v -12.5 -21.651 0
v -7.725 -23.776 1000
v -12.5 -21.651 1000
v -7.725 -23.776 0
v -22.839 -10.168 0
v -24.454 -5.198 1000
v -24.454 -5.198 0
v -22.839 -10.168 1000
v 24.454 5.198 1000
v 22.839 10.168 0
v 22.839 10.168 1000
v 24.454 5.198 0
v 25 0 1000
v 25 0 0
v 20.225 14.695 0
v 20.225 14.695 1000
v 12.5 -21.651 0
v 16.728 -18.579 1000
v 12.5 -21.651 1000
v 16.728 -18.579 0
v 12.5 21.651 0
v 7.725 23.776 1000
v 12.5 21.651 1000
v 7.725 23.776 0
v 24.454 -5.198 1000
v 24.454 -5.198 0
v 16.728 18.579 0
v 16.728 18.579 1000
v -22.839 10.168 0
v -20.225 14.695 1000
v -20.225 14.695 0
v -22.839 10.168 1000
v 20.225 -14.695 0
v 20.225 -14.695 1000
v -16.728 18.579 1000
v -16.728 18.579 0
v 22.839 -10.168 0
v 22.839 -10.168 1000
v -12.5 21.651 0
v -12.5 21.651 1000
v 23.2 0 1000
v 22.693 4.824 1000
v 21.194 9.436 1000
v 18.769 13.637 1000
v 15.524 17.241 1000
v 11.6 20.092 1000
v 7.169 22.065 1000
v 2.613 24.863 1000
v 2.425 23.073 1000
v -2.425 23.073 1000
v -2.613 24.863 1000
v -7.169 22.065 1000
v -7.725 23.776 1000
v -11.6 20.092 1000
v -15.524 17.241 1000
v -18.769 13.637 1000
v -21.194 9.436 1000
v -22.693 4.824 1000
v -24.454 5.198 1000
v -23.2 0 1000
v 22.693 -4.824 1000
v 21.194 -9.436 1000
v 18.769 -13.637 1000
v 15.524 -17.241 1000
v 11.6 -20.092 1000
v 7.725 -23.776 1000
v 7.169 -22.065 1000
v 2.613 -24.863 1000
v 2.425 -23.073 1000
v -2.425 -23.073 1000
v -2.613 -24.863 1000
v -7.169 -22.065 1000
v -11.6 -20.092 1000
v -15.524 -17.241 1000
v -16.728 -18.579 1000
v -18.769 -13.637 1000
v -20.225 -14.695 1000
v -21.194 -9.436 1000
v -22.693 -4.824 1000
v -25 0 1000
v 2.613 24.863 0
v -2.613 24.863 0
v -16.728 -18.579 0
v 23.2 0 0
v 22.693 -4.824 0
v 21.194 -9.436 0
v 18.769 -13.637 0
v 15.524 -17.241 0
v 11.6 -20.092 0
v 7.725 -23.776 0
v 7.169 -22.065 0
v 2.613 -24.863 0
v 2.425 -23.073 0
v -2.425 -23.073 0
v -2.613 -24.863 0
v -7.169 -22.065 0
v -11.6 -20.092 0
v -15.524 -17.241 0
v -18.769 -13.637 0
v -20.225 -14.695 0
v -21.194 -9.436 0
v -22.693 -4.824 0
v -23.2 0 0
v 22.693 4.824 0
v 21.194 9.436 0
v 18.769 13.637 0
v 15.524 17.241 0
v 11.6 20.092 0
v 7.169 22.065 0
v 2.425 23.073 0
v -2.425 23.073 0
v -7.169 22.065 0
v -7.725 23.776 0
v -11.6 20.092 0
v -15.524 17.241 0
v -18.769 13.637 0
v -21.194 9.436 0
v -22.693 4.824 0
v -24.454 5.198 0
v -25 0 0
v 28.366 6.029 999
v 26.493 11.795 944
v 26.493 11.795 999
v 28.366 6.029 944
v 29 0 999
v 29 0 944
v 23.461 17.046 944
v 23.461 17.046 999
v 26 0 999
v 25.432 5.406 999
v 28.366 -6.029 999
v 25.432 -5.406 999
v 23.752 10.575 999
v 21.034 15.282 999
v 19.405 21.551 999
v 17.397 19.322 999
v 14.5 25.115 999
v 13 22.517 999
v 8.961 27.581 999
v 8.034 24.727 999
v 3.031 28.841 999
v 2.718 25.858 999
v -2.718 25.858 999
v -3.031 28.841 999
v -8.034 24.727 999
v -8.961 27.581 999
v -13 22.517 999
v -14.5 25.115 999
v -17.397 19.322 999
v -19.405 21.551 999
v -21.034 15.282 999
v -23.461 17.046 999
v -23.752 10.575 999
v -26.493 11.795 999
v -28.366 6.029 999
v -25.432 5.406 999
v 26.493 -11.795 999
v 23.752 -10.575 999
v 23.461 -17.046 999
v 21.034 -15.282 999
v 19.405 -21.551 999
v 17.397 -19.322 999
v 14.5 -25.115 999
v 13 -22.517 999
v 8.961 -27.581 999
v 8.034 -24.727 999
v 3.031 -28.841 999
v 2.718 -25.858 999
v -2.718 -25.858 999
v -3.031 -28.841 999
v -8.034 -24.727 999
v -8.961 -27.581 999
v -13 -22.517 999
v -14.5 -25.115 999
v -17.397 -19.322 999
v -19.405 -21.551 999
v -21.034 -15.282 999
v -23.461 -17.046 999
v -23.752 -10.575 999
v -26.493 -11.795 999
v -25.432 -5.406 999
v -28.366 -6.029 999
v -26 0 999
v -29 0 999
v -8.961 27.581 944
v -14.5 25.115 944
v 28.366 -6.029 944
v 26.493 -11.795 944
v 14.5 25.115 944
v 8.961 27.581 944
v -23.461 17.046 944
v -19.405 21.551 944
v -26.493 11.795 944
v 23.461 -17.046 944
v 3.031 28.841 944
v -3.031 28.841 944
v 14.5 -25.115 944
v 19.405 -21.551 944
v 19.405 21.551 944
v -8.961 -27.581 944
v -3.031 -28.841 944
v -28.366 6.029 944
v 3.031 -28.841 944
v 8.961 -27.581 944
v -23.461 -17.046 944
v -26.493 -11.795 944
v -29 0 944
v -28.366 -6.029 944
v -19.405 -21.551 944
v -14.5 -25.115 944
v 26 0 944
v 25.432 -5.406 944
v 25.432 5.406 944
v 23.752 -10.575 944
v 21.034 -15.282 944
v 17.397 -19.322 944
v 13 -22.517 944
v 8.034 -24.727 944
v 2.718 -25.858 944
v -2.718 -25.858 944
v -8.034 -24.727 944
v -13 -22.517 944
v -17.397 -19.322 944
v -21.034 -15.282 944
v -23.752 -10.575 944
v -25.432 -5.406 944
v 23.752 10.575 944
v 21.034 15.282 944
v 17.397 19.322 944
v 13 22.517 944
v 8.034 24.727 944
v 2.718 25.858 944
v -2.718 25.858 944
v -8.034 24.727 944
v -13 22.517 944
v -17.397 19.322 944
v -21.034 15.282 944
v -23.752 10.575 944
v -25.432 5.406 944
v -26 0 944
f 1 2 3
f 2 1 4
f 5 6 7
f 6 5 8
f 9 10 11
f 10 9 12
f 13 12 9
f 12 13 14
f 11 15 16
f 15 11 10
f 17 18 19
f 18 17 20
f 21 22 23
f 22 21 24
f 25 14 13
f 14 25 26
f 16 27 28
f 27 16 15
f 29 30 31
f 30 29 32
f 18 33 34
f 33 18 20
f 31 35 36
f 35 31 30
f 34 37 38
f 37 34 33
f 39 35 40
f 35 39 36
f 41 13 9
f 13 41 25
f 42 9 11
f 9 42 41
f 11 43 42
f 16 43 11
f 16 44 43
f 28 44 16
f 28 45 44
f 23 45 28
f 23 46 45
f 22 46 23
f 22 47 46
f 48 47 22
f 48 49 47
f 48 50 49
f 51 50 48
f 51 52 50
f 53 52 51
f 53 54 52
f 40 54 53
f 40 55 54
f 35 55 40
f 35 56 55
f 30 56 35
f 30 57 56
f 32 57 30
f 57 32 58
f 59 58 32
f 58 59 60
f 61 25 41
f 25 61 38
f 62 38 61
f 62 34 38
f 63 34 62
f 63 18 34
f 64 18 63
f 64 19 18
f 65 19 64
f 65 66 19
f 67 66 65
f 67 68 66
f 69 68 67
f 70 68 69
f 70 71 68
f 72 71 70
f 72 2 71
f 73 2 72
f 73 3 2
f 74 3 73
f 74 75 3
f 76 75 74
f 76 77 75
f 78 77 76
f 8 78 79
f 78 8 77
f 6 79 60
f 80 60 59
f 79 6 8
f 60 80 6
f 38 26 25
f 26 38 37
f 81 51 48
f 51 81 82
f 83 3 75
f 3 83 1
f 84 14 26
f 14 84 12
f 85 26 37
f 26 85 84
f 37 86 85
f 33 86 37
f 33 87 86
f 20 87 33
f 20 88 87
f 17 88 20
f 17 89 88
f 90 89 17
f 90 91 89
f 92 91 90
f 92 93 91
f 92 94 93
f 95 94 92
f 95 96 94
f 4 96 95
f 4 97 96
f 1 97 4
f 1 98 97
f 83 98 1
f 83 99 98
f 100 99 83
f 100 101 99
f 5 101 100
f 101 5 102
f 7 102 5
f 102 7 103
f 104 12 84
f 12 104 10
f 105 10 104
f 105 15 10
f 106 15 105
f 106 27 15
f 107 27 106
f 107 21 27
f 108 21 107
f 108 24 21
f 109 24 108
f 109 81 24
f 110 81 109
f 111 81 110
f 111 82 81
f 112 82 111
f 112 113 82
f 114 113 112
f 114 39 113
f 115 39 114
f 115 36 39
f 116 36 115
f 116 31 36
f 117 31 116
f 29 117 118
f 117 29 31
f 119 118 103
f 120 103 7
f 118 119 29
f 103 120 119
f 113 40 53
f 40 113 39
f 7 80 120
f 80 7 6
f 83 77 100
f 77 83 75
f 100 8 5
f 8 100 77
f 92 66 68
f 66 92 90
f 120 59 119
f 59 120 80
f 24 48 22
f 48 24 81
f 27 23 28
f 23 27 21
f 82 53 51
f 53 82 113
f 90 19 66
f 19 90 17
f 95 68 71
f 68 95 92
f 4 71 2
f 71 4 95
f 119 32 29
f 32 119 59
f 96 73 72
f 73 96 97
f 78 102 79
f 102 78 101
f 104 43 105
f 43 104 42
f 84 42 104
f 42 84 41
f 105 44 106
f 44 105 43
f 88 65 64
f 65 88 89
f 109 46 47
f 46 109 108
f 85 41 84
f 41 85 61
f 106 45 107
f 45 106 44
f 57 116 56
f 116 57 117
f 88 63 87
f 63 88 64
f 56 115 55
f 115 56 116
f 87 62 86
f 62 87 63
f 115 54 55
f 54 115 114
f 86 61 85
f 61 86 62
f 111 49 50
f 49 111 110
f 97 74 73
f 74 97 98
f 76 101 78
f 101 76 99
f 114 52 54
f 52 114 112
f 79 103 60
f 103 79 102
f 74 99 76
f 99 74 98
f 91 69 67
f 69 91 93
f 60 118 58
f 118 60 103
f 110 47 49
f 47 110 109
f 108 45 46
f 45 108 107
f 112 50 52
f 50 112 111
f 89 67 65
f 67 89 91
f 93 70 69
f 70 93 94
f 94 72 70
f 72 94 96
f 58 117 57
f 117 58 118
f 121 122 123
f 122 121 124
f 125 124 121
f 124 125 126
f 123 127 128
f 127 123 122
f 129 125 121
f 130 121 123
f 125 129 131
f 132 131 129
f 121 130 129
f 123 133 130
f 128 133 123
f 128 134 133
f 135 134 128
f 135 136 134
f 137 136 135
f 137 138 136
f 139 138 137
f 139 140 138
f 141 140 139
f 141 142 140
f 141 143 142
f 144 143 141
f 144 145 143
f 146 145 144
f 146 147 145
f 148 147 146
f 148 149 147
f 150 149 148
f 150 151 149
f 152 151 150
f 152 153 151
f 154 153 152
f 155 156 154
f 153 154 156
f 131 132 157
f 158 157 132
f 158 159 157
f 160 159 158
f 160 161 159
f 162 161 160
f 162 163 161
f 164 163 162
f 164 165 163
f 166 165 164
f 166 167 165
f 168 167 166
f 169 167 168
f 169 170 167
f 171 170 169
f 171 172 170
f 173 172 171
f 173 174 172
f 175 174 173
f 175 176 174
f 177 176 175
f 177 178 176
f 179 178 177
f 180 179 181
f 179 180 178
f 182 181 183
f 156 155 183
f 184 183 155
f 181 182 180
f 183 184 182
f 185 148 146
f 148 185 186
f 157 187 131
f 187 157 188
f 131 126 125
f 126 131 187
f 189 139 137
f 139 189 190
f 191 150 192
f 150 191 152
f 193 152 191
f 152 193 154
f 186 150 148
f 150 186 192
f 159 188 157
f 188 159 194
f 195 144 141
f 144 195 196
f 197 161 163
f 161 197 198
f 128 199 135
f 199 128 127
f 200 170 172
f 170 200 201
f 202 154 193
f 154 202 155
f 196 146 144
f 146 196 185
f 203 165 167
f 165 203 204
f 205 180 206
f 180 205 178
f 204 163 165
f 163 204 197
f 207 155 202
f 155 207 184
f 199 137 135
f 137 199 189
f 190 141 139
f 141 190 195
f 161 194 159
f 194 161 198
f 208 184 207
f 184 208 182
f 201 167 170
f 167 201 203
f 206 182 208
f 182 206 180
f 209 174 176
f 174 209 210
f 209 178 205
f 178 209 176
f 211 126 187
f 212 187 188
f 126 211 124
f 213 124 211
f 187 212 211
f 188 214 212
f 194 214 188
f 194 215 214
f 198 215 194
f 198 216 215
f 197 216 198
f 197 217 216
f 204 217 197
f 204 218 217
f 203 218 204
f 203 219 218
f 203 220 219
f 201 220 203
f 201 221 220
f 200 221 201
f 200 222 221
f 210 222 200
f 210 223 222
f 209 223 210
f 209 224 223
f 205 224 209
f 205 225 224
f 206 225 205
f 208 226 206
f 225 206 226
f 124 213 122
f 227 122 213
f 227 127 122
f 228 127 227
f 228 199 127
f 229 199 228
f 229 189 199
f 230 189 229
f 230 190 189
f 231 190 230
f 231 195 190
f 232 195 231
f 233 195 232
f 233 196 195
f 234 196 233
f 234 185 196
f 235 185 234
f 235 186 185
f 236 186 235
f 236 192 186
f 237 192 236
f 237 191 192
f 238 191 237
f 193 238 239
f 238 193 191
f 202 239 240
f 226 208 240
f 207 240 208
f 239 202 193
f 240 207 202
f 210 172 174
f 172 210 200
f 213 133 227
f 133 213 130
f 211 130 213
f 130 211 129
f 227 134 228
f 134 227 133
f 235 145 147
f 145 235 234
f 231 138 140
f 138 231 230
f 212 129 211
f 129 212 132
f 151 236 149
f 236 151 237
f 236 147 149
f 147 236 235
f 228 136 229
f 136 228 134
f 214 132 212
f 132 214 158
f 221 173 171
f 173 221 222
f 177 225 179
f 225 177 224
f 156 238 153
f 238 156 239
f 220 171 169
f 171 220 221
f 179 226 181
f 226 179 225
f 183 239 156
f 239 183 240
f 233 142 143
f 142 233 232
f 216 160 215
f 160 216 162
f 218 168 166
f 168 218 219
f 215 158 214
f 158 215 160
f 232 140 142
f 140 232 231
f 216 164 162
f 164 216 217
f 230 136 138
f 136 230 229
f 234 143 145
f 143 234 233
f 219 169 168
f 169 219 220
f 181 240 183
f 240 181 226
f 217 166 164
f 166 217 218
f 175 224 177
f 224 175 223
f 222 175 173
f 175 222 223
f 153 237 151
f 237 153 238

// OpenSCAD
// Parameters
length_mm = 1000; //[500:2000:10]
ht50_outer_diameter = 50; //[40:80:1]
ht50_wall_thickness = 1.8; //[1:4:0.1]
fitting_length = 55; //[30:120:1]
fitting_outer_diameter = 58; //[52:90:1]
fitting_wall_extra = 1.2; //[0.5:3:0.1]
fitting_stop_thickness = 3; //[1:8:0.5]
overlap_mm = 1; //[0.5:2:0.1]

// HT Pipe - complete geometry
module ht_pipe() {
  color([0.85, 0.85, 0.8]) { // PVC color
    union() {
      // Pipe body
      difference() {
        cylinder(h=length_mm, r=ht50_outer_diameter/2, center=false);
        translate([0, 0, -overlap_mm])
          cylinder(h=length_mm + overlap_mm*2, r=ht50_outer_diameter/2 - ht50_wall_thickness, center=false);
      }
      
      // End fitting
      difference() {
        translate([0, 0, length_mm - fitting_length - overlap_mm])
          cylinder(h=fitting_length, r=fitting_outer_diameter/2, center=false);
        translate([0, 0, length_mm - fitting_length - overlap_mm - overlap_mm])
          cylinder(h=fitting_length + overlap_mm*2, r=fitting_outer_diameter/2 - (ht50_wall_thickness + fitting_wall_extra), center=false);
        translate([0, 0, length_mm - fitting_stop_thickness - overlap_mm])
          cylinder(h=fitting_stop_thickness + overlap_mm*2, r=ht50_outer_diameter/2, center=false);
      }
    }
  }
}

// Assembly
module assembly() {
  ht_pipe();
}

assembly();
